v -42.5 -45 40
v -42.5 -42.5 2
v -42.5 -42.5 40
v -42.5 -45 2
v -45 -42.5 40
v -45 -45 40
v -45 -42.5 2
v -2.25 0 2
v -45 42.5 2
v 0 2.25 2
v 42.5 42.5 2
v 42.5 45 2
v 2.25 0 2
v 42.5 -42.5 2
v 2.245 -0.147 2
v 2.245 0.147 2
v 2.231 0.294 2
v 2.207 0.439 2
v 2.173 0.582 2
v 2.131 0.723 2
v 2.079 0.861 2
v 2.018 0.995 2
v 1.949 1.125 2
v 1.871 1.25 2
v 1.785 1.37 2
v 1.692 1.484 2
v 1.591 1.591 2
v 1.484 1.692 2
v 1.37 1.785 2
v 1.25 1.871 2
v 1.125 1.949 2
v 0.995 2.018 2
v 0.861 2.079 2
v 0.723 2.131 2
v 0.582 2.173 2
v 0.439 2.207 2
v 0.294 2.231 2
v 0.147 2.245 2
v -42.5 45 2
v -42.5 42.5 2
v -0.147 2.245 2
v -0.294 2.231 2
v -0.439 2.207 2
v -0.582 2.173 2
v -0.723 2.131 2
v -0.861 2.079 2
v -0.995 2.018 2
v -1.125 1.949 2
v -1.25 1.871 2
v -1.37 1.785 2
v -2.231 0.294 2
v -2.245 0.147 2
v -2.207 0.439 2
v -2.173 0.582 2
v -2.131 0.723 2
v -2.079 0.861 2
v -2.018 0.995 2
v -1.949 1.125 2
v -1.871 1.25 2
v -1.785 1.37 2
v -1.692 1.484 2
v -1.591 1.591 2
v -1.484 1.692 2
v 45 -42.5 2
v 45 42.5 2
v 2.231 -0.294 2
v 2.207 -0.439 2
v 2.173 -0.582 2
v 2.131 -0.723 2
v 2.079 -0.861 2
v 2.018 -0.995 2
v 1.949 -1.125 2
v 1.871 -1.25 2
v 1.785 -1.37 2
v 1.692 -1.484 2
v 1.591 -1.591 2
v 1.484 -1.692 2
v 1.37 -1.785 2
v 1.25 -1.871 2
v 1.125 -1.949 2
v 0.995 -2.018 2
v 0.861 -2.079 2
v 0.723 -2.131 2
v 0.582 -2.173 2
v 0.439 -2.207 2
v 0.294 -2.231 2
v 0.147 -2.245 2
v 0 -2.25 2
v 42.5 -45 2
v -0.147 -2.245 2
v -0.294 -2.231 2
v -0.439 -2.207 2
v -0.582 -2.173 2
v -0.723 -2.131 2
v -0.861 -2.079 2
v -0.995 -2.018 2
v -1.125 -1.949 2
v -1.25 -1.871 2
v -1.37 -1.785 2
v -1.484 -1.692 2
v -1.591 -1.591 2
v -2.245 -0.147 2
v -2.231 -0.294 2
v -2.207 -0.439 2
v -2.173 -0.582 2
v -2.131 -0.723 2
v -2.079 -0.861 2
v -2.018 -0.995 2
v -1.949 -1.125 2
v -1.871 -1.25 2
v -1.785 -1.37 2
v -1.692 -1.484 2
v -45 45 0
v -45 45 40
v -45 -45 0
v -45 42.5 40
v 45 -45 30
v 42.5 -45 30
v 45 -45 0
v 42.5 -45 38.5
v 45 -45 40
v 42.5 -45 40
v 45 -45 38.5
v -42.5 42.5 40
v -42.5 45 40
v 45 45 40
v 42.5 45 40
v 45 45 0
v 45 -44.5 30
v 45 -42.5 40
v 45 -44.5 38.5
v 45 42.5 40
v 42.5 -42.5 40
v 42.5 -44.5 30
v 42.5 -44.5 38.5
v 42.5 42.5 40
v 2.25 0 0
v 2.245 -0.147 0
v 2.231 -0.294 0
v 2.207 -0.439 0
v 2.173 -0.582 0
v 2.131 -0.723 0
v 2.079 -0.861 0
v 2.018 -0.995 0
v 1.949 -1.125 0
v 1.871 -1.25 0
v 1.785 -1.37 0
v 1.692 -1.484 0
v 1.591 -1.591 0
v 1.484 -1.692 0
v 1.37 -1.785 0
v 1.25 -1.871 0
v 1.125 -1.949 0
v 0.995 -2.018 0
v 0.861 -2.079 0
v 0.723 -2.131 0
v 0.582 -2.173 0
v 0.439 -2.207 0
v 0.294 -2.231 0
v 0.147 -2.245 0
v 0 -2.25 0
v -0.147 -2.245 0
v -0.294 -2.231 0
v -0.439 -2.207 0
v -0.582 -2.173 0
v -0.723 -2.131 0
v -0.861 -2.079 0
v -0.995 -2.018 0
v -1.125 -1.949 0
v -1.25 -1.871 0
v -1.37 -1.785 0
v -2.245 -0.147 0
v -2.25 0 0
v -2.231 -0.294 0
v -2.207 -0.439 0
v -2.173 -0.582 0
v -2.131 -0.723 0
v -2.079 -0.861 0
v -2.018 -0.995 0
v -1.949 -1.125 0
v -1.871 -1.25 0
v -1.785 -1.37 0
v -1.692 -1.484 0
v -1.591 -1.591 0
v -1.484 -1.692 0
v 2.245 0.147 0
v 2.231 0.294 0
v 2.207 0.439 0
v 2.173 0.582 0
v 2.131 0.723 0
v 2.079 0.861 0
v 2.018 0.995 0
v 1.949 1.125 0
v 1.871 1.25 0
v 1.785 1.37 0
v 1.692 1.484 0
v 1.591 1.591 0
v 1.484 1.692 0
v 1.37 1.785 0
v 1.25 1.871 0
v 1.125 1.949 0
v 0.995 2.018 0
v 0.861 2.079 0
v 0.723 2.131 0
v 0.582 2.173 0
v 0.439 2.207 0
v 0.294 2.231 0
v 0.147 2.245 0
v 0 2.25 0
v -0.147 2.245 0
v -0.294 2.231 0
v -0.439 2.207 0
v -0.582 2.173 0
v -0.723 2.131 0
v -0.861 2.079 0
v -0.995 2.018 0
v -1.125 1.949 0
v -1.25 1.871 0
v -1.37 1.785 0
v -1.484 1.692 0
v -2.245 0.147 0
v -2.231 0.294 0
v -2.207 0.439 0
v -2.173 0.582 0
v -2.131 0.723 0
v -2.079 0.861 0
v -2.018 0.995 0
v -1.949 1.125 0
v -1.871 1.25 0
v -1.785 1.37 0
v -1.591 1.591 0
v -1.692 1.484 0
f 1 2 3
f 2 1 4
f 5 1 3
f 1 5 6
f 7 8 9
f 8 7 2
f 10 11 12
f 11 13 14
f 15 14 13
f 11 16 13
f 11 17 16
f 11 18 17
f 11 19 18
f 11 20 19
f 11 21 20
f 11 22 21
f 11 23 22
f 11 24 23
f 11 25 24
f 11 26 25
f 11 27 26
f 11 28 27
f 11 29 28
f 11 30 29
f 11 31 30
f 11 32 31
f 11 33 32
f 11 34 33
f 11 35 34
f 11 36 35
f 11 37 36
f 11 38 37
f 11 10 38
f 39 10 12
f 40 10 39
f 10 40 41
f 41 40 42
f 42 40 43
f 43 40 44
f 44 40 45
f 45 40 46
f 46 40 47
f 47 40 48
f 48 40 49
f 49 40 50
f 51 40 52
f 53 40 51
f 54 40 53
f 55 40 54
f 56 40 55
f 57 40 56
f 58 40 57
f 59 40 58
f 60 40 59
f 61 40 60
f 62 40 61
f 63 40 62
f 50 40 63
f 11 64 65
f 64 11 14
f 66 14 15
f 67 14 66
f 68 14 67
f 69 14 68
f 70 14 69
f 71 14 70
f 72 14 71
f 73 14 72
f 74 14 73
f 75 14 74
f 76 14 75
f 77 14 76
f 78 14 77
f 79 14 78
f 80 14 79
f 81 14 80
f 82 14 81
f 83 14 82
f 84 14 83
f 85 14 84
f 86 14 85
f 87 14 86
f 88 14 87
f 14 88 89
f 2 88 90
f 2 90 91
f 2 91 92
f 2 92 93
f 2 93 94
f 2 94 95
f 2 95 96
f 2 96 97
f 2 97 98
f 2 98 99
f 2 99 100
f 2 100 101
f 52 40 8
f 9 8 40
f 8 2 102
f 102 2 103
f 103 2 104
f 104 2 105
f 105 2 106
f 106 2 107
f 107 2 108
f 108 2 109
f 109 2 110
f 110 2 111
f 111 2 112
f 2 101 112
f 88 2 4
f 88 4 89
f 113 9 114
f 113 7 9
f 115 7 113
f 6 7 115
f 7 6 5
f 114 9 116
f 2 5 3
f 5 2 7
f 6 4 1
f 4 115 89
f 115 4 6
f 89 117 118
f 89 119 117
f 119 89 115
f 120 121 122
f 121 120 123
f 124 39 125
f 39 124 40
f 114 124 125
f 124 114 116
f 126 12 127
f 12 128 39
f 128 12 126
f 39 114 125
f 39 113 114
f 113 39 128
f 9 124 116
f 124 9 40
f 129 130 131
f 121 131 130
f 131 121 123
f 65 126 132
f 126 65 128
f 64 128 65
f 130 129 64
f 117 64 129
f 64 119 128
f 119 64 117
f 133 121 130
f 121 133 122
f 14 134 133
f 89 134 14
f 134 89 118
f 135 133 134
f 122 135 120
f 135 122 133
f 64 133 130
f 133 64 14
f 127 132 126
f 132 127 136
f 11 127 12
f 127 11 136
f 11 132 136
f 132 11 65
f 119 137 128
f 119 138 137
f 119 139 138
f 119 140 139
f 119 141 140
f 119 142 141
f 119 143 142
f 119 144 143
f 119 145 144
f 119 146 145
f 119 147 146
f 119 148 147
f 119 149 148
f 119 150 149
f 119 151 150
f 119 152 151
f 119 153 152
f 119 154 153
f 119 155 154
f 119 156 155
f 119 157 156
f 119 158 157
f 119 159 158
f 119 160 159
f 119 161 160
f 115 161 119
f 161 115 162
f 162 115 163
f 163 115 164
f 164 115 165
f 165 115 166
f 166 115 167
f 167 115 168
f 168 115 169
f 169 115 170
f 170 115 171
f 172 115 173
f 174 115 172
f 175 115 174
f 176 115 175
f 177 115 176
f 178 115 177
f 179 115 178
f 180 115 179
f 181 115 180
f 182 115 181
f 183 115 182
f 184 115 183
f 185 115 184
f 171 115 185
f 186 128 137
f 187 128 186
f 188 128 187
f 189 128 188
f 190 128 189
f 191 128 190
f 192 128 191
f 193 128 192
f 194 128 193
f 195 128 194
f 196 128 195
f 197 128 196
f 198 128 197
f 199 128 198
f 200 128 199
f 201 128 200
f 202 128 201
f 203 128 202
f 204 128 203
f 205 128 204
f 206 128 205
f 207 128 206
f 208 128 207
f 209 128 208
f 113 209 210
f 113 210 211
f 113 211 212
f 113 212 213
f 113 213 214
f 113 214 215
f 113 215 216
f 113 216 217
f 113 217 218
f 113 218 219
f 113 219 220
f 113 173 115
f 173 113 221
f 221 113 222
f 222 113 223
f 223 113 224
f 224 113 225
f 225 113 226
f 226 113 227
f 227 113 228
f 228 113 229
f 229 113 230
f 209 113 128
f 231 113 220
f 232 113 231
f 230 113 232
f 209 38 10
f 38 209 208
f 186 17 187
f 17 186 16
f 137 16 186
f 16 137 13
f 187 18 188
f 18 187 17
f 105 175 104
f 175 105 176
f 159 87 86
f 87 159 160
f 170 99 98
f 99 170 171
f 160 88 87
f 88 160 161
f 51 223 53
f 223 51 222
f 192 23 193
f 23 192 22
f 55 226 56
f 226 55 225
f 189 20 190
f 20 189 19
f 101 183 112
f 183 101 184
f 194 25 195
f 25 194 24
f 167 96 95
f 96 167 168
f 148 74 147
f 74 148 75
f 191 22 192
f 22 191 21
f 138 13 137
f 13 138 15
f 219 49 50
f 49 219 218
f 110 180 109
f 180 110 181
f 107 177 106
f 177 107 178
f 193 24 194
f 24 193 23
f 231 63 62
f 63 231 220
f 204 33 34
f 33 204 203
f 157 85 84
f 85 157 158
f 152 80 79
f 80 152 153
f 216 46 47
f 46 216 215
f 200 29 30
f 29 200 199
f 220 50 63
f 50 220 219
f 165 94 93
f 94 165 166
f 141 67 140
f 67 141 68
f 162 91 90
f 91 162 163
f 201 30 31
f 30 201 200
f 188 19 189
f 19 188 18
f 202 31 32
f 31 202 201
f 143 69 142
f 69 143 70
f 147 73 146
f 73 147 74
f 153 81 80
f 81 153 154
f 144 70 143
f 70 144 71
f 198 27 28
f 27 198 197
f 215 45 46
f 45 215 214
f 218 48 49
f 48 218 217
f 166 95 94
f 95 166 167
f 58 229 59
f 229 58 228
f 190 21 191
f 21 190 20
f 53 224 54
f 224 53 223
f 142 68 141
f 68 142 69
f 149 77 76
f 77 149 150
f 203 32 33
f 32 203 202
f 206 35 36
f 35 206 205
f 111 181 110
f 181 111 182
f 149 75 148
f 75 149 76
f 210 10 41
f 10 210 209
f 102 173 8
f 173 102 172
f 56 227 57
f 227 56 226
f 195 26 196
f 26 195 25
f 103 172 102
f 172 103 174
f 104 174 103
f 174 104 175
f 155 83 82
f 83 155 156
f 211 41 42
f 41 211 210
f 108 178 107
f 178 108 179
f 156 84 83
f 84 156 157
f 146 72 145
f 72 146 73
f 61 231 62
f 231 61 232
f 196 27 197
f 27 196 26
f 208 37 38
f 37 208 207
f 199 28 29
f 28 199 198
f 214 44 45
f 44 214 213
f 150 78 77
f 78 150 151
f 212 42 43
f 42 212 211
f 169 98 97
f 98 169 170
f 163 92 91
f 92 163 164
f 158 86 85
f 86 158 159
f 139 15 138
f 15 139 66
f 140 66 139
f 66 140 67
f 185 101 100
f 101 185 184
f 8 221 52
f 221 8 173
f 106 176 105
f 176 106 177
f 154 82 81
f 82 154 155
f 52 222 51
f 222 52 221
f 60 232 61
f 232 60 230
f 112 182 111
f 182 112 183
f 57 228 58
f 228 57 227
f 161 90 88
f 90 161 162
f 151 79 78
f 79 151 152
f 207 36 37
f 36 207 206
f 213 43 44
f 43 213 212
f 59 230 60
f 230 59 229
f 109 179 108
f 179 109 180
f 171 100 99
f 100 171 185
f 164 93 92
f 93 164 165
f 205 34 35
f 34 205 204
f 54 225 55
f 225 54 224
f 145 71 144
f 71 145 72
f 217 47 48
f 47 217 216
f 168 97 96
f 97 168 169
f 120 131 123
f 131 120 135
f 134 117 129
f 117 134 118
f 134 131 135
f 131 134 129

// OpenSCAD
// DIY magnetic stirrer housing for 80 mm PC case fan
// Print orientation: upside-down open box, top plate on bed (z = 0 to 2)

// ---------- Parameters ----------
top_thickness      = 2;     // top plate thickness
wall_thickness     = 2.5;   // wall thickness
box_height         = 40;    // total height of walls (z = 0 to 40)
outer_size         = 90;    // outer X and Y size of box
screw_hole_d       = 4.5;   // M4 screw hole diameter
screw_hole_count   = 4;     // number of screw holes
screw_hole_pitch   = 71.5;  // square pattern size for holes
cable_notch_w      = 12;    // cable notch width
cable_notch_depth  = 8;     // notch depth from open edge (z = 32 to 40)
eps                = 0.5;   // overcut for clean differences
$fn                = 96;    // curve resolution

// ---------- Model ----------
difference() {
    union() {
        // Top plate
        translate([-outer_size/2, -outer_size/2, 0])
            cube([outer_size, outer_size, top_thickness]);

        // Walls, open top
        for (sx = [-1, 1], sy = [-1, 1])
            translate([sx > 0 ? outer_size/2 - wall_thickness : -outer_size/2,
                       sy > 0 ? outer_size/2 - wall_thickness : -outer_size/2,
                       top_thickness])
                cube([wall_thickness, wall_thickness, box_height - top_thickness]);
    }

    // Screw holes through top plate
    for (i = [0 : screw_hole_count - 1]) {
        angle = i * 90;
        translate([screw_hole_pitch/2 * [cos(angle), sin(angle)], 0, -eps])
            cylinder(d = screw_hole_d, h = top_thickness + 2 * eps);
    }

    // Cable notch in one wall (from z = 32 to z = 40)
    translate([outer_size/2 - wall_thickness - cable_notch_w/2,
               -outer_size/2 - eps,
               box_height - top_thickness - cable_notch_depth])
        cube([cable_notch_w, 2 * eps, cable_notch_depth + eps]);
}
